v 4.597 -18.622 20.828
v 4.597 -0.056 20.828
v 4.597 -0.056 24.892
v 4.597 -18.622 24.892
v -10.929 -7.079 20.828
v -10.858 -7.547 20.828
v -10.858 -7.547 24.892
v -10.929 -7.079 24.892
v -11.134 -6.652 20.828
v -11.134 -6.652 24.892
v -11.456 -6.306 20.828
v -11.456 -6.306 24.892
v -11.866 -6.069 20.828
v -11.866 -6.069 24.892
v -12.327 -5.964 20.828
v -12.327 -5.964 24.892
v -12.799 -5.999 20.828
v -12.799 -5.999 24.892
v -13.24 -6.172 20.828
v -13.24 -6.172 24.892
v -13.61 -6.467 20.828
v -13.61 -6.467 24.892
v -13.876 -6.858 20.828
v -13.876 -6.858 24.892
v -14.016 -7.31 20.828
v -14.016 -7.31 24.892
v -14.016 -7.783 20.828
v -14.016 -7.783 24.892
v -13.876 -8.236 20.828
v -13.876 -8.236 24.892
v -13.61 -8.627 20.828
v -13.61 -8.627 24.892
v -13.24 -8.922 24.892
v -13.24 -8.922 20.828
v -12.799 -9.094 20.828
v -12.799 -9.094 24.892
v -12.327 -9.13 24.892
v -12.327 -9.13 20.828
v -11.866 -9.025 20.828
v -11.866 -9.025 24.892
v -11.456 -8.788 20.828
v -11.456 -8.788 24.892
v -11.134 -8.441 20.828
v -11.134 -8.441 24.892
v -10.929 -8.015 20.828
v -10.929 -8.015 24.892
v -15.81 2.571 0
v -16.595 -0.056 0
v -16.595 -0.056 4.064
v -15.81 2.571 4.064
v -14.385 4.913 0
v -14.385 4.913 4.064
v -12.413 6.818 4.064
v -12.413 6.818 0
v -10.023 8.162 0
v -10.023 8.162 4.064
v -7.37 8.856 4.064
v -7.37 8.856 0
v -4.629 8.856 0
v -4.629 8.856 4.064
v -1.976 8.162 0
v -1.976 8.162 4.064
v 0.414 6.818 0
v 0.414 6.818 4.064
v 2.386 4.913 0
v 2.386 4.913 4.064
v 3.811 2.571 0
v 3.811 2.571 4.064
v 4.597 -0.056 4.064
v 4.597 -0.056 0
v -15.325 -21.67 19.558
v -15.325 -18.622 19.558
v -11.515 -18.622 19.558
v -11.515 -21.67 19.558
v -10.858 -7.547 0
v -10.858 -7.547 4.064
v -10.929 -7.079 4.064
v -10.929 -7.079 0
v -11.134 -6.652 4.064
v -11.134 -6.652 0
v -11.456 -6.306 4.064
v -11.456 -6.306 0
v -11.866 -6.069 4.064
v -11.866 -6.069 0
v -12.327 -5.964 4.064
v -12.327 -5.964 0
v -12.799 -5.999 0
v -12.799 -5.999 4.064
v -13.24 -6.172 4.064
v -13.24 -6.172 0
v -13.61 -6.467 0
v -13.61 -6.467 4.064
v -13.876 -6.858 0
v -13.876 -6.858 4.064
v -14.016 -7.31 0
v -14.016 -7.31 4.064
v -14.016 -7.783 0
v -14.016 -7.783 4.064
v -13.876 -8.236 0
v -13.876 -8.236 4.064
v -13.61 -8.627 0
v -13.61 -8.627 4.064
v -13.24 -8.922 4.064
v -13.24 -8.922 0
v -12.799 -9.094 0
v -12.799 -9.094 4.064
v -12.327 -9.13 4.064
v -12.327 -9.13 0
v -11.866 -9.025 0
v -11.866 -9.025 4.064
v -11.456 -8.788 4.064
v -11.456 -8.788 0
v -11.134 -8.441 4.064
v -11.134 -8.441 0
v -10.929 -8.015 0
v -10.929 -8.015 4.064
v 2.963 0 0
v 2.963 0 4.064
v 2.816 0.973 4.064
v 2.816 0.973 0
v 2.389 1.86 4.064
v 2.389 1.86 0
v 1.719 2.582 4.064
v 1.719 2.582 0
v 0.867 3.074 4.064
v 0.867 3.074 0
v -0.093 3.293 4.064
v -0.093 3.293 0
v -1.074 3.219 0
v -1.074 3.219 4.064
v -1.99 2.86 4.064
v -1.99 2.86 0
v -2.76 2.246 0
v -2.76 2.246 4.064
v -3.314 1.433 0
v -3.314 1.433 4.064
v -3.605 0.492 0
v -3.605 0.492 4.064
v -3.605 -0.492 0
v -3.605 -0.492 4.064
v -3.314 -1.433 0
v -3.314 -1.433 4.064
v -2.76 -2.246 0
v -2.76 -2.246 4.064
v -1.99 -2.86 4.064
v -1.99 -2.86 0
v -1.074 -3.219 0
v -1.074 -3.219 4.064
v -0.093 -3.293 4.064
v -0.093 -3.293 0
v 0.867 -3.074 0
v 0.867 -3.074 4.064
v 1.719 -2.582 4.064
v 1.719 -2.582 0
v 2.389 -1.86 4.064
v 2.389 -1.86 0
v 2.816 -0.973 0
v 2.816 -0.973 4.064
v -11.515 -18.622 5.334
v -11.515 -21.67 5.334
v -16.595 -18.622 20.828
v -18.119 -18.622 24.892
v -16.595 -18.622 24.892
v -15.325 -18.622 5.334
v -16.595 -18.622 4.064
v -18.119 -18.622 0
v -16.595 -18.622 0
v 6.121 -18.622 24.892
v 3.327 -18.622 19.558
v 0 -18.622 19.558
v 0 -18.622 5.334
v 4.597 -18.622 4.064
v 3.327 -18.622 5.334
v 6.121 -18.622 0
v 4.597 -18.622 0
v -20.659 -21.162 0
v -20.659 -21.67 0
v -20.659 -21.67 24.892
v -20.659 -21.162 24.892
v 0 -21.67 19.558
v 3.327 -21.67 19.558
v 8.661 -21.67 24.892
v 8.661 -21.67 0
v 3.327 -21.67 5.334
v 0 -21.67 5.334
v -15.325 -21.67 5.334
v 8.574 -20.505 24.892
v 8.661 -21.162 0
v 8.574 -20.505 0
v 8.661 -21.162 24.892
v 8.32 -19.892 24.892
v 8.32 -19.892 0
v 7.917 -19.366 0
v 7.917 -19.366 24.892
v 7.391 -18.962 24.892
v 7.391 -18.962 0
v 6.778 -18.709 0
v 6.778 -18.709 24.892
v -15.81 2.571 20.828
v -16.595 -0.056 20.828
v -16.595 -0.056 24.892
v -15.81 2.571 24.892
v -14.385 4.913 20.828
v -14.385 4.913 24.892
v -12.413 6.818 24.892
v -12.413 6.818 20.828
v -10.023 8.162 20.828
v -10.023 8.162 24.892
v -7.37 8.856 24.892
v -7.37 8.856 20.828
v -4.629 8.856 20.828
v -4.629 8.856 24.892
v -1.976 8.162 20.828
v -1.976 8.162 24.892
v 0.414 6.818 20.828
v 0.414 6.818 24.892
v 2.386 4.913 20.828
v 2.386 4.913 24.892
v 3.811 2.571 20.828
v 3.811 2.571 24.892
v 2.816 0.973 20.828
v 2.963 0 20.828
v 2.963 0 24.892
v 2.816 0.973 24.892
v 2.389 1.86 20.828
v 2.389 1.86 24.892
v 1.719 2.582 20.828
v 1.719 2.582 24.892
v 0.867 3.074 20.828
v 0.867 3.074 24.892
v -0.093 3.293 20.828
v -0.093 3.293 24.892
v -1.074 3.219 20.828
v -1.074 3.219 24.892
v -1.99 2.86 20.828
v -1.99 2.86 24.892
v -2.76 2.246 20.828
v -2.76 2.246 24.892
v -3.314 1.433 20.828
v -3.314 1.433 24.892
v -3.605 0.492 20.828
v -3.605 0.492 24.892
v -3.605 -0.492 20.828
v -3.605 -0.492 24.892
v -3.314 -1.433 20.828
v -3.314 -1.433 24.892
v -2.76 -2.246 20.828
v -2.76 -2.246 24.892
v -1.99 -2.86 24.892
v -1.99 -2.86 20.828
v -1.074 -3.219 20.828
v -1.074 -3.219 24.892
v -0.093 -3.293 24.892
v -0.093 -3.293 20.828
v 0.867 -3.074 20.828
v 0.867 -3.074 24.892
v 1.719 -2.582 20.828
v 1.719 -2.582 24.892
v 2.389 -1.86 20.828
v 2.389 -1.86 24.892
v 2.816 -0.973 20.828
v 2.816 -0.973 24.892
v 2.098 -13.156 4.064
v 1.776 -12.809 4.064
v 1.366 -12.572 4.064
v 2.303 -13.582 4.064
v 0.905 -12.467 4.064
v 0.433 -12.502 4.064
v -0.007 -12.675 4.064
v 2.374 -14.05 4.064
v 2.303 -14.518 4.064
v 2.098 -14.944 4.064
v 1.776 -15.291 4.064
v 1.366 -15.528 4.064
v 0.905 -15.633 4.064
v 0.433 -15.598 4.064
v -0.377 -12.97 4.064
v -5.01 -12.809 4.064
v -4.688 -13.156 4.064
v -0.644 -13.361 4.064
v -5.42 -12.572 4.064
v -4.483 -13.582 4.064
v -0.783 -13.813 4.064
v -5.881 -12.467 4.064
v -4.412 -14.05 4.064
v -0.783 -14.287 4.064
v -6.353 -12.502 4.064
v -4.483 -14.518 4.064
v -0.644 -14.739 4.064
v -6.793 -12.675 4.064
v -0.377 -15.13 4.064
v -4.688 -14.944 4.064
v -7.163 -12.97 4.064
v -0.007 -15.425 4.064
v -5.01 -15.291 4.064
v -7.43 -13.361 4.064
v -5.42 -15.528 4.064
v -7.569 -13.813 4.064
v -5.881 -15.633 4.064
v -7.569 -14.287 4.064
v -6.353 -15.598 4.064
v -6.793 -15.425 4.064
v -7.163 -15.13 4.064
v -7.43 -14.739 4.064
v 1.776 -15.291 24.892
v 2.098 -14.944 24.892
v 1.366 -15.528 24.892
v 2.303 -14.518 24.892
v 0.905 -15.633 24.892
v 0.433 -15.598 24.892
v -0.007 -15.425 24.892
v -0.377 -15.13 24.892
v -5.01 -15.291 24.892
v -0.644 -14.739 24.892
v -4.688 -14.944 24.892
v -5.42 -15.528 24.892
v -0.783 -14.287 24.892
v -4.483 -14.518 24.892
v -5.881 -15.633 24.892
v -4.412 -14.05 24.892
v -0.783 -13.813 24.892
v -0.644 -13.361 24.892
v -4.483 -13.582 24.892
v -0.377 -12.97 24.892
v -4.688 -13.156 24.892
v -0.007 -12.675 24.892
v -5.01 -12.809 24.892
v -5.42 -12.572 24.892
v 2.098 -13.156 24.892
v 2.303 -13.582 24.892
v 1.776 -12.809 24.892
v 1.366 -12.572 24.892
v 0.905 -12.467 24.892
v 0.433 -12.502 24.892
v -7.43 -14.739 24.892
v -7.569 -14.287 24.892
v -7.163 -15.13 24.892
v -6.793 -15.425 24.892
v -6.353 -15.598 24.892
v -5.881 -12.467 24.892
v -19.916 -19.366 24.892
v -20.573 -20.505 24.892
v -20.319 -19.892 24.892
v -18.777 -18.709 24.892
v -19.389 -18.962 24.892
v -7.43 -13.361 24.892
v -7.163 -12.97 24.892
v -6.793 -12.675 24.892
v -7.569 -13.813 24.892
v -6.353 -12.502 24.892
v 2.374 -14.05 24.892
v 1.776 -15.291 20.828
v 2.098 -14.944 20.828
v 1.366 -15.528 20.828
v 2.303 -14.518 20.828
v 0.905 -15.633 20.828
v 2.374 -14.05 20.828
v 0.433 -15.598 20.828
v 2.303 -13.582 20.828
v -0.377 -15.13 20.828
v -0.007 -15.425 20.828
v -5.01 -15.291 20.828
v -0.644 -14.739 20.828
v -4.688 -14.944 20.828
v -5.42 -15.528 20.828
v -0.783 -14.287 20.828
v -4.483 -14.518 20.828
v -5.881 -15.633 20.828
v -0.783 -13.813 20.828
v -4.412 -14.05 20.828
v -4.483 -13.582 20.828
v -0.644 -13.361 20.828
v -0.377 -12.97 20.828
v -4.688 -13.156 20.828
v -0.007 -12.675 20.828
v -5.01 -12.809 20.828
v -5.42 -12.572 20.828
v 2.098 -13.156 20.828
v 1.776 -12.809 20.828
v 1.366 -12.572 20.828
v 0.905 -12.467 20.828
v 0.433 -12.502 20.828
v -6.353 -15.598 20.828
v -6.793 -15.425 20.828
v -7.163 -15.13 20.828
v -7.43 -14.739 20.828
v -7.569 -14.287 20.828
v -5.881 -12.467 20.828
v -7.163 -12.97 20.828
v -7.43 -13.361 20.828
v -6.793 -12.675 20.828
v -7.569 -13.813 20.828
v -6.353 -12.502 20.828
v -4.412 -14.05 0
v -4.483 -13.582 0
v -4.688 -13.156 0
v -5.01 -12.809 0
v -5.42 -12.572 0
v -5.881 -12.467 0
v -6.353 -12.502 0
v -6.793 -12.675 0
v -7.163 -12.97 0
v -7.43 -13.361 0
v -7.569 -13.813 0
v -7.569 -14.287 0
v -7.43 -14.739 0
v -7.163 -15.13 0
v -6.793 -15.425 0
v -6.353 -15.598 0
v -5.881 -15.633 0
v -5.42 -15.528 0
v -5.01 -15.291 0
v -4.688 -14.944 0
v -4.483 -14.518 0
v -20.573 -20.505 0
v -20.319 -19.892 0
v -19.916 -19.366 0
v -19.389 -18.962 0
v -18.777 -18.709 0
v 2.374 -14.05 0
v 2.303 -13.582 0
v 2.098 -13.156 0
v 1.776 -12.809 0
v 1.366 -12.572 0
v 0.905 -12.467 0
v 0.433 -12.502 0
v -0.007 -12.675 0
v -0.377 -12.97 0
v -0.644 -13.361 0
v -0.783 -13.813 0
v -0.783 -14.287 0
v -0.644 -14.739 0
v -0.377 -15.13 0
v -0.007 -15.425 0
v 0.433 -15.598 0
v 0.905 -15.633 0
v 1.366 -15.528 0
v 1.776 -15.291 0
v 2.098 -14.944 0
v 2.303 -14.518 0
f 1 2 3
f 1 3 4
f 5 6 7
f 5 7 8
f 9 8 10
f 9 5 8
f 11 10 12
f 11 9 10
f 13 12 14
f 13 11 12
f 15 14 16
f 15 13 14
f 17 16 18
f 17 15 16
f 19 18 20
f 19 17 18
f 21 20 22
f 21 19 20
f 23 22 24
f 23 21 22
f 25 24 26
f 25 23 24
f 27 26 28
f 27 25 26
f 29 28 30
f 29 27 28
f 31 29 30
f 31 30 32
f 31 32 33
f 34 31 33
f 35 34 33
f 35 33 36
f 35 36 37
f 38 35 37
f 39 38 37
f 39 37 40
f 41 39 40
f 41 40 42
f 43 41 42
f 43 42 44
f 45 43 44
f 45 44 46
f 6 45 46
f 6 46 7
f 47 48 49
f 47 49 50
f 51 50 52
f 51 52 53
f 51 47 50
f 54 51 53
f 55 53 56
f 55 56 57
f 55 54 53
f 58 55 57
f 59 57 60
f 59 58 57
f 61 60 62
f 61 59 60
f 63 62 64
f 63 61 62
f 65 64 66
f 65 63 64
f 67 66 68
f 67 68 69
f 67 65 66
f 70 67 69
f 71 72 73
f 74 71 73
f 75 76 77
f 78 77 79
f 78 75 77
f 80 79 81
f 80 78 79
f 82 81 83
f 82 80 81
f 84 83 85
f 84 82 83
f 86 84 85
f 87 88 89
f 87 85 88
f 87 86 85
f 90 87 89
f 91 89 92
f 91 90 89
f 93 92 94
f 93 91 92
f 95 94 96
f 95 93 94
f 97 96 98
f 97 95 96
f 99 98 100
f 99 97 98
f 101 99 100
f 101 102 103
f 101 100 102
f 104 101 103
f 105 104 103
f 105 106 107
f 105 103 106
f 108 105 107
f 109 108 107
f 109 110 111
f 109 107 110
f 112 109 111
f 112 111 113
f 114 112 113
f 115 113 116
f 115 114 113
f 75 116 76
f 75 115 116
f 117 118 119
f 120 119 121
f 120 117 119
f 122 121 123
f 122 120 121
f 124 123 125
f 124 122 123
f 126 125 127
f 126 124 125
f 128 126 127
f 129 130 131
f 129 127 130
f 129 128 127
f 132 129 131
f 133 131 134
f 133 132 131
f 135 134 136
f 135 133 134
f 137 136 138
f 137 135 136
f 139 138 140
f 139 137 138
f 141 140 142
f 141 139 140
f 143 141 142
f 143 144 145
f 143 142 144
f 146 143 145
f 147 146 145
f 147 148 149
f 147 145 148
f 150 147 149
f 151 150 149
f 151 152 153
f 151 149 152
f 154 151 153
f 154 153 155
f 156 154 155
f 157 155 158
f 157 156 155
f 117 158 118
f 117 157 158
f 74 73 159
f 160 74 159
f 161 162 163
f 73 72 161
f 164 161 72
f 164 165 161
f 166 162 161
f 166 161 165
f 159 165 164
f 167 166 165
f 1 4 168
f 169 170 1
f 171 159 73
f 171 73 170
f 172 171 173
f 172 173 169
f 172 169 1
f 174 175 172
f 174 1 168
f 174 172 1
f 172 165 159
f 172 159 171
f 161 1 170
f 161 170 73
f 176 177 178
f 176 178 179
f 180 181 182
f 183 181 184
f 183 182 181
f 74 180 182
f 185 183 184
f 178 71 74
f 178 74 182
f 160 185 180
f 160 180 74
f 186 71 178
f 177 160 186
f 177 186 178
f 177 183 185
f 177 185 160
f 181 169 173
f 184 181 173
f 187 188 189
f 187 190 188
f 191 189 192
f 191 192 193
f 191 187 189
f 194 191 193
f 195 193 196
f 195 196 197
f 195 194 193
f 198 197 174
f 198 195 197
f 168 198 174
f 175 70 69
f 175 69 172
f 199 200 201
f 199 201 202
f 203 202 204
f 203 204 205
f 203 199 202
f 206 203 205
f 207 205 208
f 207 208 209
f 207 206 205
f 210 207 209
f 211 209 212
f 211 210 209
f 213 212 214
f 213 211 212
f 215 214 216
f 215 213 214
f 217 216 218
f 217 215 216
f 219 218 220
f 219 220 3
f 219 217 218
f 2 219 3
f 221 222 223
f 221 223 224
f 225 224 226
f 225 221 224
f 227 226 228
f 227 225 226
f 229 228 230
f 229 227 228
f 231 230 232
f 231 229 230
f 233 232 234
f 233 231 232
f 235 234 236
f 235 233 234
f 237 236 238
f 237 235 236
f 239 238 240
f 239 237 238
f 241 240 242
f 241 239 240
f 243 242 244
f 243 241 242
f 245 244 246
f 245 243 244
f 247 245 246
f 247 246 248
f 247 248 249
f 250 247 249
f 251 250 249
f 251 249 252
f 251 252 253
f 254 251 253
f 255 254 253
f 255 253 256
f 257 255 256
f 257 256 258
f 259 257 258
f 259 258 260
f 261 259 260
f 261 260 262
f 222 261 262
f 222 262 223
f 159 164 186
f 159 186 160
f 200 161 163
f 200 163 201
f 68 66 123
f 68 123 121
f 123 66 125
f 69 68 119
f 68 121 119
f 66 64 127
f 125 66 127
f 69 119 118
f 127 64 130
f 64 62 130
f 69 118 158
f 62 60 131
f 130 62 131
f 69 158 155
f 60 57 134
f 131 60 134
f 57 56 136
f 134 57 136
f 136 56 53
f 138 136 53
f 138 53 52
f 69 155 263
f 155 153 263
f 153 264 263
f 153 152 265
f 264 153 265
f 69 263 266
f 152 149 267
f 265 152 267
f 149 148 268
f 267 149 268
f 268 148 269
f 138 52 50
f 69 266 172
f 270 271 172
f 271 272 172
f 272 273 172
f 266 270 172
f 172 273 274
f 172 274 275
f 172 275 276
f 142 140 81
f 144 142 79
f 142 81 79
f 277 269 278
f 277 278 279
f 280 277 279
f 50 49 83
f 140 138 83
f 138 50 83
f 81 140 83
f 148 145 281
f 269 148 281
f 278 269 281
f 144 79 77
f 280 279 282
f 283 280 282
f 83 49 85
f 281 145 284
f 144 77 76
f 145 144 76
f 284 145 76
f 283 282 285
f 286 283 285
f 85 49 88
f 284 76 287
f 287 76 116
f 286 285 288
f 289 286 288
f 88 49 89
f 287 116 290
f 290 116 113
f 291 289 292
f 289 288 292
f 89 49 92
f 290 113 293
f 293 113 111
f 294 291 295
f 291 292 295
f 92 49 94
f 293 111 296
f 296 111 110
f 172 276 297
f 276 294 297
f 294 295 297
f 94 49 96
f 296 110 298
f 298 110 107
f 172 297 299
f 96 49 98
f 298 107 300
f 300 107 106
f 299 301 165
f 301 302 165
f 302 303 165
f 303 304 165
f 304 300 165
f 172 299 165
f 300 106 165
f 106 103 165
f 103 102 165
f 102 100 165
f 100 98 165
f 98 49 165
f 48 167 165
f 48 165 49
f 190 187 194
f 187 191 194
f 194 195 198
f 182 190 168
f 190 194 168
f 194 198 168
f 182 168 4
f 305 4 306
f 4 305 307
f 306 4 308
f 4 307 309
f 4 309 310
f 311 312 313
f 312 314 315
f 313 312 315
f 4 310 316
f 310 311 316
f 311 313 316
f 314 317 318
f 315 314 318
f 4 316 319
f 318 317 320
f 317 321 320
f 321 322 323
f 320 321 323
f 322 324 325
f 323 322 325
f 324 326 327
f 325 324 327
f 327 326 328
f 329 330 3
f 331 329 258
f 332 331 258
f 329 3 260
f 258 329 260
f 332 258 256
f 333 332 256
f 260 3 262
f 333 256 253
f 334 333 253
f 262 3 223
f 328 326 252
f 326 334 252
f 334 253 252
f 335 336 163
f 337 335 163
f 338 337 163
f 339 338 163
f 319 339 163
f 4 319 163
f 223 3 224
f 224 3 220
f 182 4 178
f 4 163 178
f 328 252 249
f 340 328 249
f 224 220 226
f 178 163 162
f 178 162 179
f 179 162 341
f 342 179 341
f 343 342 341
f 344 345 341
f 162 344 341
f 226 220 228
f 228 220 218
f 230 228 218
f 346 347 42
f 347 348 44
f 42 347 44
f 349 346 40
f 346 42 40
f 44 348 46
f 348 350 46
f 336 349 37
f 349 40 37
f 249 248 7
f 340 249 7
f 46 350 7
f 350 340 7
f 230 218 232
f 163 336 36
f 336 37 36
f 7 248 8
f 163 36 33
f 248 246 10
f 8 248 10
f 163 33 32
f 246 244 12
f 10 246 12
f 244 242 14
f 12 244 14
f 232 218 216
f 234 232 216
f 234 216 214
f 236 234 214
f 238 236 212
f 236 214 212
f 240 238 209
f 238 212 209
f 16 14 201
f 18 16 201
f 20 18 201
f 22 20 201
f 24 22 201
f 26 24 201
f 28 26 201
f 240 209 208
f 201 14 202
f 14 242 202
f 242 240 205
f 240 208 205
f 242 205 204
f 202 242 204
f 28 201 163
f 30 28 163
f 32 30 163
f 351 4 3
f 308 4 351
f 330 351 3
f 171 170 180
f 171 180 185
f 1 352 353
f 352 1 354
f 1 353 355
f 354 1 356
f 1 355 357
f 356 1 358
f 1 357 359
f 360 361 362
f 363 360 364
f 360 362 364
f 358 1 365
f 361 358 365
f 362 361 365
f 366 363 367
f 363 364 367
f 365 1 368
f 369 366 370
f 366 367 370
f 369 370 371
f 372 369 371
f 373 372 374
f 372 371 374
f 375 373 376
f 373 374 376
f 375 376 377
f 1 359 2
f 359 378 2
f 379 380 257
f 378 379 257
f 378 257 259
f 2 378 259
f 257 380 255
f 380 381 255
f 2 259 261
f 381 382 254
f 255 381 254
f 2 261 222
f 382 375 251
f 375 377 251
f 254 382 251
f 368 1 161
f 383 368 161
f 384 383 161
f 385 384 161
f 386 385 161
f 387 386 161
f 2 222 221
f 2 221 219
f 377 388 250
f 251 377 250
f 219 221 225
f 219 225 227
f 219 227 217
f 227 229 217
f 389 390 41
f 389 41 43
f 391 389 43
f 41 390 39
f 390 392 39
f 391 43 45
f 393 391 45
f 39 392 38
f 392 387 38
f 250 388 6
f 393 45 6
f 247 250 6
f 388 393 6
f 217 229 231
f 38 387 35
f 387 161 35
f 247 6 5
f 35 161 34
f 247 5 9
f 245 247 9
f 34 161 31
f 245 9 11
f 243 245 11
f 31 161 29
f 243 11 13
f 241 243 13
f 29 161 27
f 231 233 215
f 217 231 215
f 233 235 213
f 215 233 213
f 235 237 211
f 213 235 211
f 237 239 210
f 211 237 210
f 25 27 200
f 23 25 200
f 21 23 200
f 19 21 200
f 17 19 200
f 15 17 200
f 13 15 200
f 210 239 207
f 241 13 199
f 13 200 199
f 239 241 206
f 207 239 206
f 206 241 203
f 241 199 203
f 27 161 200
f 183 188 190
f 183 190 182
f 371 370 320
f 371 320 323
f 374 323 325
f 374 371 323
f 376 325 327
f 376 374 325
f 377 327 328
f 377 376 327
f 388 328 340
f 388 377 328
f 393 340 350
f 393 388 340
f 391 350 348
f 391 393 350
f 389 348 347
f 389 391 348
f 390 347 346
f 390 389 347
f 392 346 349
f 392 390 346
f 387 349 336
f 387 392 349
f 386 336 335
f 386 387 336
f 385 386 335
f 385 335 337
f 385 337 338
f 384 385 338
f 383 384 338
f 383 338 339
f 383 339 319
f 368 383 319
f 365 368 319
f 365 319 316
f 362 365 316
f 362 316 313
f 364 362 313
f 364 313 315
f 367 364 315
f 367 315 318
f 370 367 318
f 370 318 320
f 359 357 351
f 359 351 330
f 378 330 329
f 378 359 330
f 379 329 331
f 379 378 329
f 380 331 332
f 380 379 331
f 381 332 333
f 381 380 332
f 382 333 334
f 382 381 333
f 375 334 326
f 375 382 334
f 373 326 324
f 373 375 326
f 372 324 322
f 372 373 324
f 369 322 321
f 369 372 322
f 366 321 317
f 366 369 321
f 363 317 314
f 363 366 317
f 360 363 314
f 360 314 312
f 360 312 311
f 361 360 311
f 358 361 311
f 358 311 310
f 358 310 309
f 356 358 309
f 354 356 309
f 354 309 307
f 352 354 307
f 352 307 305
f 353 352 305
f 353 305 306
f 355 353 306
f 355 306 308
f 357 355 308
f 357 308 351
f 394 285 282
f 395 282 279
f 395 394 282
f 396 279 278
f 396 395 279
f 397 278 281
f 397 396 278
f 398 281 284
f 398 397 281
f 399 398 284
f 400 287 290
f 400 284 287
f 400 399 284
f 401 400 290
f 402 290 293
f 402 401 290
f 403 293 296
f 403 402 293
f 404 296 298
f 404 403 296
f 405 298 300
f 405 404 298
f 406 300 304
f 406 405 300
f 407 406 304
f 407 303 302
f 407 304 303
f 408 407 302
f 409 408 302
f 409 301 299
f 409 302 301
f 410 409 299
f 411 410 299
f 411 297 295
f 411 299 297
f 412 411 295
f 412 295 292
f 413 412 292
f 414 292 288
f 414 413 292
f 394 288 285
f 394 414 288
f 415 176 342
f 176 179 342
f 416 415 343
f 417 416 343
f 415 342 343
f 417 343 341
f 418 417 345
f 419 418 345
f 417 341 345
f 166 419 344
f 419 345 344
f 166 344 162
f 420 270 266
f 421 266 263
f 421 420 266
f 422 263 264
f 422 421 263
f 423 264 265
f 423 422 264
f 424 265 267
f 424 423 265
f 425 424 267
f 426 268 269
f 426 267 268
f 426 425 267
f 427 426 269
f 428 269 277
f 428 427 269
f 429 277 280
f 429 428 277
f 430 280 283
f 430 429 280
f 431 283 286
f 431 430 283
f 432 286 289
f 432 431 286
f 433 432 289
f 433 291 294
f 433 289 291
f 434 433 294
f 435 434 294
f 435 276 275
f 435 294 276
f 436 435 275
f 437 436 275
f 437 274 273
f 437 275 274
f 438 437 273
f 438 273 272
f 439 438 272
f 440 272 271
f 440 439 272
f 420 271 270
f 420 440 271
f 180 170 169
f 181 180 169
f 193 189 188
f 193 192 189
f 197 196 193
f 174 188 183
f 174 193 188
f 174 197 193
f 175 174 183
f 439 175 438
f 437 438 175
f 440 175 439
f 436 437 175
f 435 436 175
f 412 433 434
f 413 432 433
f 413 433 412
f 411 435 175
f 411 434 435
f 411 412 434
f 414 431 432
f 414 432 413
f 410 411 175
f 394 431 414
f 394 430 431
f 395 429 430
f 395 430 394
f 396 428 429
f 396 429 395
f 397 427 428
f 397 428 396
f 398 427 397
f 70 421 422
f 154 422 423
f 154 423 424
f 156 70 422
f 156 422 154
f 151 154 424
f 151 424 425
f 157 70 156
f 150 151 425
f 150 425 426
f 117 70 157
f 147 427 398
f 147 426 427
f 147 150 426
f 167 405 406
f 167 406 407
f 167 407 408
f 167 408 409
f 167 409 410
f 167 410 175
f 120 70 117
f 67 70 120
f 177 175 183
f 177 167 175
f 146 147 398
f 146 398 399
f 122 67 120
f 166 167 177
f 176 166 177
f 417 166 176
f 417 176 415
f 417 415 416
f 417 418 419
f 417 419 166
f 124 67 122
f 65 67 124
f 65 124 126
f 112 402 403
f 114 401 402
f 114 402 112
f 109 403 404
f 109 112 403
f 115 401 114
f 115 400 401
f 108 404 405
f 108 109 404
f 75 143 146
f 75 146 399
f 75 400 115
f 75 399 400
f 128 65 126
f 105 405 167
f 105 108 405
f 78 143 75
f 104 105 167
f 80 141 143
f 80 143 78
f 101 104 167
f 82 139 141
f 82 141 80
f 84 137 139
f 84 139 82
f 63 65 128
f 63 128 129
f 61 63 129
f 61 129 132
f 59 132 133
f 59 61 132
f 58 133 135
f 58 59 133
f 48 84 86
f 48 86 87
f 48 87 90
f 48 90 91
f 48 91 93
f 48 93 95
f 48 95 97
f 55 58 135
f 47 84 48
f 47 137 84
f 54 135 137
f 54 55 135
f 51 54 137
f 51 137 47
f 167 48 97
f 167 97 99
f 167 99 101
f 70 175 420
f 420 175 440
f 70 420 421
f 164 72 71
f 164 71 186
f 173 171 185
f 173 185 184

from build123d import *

# Parameters (mm, degrees)
SKETCH2_R           = 1.5875
SKETCH2_R_2         = 3.302
BOSS_EXTRUDE1_DEPTH = 24.892
CUT_EXTRUDE2_DEPTH  = 21.844
SKETCH4_W           = 3.326504507
SKETCH4_H           = 14.224
SKETCH4_W_2         = 3.81
CUT_EXTRUDE3_DEPTH  = 21.844
FILLET1_R           = 2.54


with BuildPart() as part:
    # Sketch2 → Boss-Extrude1 (new body)
    with BuildSketch(Plane.XY):
        with BuildLine():
            Line((8.660504507, -21.669967929), (-20.659495493, -21.669967929))
            Line((-20.659495493, -21.669967929), (-20.659495493, -18.621967929))
            Line((-20.659495493, -18.621967929), (-16.595495493, -18.621967929))
            Line((-16.595495493, -18.621967929), (-16.595495493, -0.055984768))
            ThreePointArc((-16.595495493, -0.055984768), (-5.999495493, 8.944015232), (4.596504507, -0.055984768))
            Line((4.596504507, -0.055984768), (4.596504507, -18.621967929))
            Line((4.596504507, -18.621967929), (8.660504507, -18.621967929))
            Line((8.660504507, -18.621967929), (8.660504507, -21.669967929))
        make_face()
        with Locations((-12.446, -7.546743134)):
            Circle(SKETCH2_R, mode=Mode.SUBTRACT)
        with Locations((-0.339495493, 0)):
            Circle(SKETCH2_R_2, mode=Mode.SUBTRACT)
        with Locations((-5.999495493, -14.049967929)):
            Circle(SKETCH2_R, mode=Mode.SUBTRACT)
        with Locations((0.786504507, -14.049967929)):
            Circle(SKETCH2_R, mode=Mode.SUBTRACT)
    extrude(amount=BOSS_EXTRUDE1_DEPTH)

    # Sketch3 → Cut-Extrude2 (cut)
    with BuildSketch(Plane.ZY.offset(16.595495493)):
        Polygon((20.828, -18.621967929), (20.828, 11.195500081), (4.064, 11.195500081), (4.064, -0.055984768), (4.064, -18.621967929), align=None)
    extrude(amount=-CUT_EXTRUDE2_DEPTH, mode=Mode.SUBTRACT)

    # Sketch4 → Cut-Extrude3 (cut)
    with BuildSketch(Plane(origin=(0, -18.621967929, 0), x_dir=(1, 0, 0), z_dir=(0, 1, 0))):
        with Locations((1.663252254, -12.446)):
            Rectangle(SKETCH4_W, SKETCH4_H)
        with Locations((-13.420495493, -12.446)):
            Rectangle(SKETCH4_W_2, SKETCH4_H)
    extrude(amount=-CUT_EXTRUDE3_DEPTH, mode=Mode.SUBTRACT)

    # Fillet1
    fillet1_edges = [part.edges().sort_by_distance(p)[0] for p in [
        (-20.659495493, -18.621967929, 12.446),
        (8.660504507, -18.621967929, 12.446),
    ]]
    fillet(fillet1_edges, radius=FILLET1_R)


solid = part.part
